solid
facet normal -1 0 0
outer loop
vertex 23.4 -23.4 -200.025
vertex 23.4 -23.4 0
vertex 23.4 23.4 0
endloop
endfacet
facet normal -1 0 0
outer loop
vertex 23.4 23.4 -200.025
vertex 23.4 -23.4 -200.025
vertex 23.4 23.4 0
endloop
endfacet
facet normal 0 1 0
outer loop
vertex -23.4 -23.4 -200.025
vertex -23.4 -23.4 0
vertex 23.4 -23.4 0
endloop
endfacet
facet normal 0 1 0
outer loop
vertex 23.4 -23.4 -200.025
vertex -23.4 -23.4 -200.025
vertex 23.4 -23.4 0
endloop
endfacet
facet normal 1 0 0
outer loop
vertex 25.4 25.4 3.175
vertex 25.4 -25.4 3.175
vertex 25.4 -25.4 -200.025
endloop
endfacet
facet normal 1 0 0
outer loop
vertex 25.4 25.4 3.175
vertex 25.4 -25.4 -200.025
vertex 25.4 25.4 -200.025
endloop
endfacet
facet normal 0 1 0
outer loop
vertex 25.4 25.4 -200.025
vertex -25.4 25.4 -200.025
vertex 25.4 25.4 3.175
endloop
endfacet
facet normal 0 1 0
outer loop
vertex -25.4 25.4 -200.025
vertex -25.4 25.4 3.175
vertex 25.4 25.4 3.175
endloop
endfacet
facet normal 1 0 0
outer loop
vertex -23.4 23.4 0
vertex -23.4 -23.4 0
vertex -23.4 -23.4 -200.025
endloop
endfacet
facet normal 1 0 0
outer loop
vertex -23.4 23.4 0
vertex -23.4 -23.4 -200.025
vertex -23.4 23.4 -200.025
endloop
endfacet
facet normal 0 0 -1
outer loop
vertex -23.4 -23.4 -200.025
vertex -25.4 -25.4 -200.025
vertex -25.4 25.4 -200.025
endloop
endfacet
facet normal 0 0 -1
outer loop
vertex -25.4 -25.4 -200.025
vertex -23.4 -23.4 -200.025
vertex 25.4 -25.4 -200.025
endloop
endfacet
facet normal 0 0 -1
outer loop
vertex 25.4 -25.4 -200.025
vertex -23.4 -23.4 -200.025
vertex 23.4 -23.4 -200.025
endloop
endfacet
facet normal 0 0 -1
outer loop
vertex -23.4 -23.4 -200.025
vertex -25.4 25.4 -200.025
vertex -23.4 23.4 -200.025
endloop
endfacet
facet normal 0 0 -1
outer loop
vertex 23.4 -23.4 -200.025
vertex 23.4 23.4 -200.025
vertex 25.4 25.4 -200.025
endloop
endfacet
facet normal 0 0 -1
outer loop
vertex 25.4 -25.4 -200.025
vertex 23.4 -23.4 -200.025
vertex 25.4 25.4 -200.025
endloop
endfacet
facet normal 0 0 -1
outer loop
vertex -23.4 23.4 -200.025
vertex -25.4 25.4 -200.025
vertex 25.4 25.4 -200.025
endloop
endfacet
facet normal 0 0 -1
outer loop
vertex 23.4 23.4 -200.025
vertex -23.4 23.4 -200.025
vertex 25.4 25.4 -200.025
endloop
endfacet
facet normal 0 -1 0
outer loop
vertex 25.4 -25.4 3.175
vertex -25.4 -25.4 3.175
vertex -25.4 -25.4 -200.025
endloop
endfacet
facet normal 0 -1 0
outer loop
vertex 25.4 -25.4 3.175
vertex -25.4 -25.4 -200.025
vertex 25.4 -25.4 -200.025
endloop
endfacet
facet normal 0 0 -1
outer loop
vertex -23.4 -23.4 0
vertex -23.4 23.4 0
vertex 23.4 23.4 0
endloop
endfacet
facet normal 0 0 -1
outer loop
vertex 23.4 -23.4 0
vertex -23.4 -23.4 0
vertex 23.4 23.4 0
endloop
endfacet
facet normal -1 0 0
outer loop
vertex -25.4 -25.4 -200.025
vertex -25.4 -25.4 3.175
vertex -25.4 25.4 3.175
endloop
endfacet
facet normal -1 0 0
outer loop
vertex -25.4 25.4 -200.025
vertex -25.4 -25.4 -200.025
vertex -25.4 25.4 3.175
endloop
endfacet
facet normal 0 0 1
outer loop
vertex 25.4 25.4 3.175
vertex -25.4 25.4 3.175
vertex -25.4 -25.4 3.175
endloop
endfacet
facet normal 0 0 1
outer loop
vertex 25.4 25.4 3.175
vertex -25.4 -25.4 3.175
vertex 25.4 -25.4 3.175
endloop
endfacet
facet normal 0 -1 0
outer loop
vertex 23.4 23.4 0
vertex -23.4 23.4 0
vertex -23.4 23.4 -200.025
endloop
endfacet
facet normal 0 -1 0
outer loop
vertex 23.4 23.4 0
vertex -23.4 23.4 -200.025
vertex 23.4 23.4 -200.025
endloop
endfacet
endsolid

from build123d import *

# Parameters (mm, degrees)
F0_W     = 50.8
F0_H     = 50.8
F0_W_2   = 46.8
F0_H_2   = 46.8
F1_DEPTH = 3.175
F2_DEPTH = 200.025


with BuildPart() as f1:
    # F0 (on Top) → F1 (new body)
    with BuildSketch(Plane.XY):
        Rectangle(F0_W, F0_H)
        Rectangle(F0_W_2, F0_H_2, mode=Mode.SUBTRACT)
        Rectangle(F0_W_2, F0_H_2)
    extrude(amount=F1_DEPTH)

    # F0 (on Top) → F2 (join)
    with BuildSketch(Plane.XY):
        Rectangle(F0_W, F0_H)
        Rectangle(F0_W_2, F0_H_2, mode=Mode.SUBTRACT)
    extrude(amount=-F2_DEPTH)


solid = f1.part
